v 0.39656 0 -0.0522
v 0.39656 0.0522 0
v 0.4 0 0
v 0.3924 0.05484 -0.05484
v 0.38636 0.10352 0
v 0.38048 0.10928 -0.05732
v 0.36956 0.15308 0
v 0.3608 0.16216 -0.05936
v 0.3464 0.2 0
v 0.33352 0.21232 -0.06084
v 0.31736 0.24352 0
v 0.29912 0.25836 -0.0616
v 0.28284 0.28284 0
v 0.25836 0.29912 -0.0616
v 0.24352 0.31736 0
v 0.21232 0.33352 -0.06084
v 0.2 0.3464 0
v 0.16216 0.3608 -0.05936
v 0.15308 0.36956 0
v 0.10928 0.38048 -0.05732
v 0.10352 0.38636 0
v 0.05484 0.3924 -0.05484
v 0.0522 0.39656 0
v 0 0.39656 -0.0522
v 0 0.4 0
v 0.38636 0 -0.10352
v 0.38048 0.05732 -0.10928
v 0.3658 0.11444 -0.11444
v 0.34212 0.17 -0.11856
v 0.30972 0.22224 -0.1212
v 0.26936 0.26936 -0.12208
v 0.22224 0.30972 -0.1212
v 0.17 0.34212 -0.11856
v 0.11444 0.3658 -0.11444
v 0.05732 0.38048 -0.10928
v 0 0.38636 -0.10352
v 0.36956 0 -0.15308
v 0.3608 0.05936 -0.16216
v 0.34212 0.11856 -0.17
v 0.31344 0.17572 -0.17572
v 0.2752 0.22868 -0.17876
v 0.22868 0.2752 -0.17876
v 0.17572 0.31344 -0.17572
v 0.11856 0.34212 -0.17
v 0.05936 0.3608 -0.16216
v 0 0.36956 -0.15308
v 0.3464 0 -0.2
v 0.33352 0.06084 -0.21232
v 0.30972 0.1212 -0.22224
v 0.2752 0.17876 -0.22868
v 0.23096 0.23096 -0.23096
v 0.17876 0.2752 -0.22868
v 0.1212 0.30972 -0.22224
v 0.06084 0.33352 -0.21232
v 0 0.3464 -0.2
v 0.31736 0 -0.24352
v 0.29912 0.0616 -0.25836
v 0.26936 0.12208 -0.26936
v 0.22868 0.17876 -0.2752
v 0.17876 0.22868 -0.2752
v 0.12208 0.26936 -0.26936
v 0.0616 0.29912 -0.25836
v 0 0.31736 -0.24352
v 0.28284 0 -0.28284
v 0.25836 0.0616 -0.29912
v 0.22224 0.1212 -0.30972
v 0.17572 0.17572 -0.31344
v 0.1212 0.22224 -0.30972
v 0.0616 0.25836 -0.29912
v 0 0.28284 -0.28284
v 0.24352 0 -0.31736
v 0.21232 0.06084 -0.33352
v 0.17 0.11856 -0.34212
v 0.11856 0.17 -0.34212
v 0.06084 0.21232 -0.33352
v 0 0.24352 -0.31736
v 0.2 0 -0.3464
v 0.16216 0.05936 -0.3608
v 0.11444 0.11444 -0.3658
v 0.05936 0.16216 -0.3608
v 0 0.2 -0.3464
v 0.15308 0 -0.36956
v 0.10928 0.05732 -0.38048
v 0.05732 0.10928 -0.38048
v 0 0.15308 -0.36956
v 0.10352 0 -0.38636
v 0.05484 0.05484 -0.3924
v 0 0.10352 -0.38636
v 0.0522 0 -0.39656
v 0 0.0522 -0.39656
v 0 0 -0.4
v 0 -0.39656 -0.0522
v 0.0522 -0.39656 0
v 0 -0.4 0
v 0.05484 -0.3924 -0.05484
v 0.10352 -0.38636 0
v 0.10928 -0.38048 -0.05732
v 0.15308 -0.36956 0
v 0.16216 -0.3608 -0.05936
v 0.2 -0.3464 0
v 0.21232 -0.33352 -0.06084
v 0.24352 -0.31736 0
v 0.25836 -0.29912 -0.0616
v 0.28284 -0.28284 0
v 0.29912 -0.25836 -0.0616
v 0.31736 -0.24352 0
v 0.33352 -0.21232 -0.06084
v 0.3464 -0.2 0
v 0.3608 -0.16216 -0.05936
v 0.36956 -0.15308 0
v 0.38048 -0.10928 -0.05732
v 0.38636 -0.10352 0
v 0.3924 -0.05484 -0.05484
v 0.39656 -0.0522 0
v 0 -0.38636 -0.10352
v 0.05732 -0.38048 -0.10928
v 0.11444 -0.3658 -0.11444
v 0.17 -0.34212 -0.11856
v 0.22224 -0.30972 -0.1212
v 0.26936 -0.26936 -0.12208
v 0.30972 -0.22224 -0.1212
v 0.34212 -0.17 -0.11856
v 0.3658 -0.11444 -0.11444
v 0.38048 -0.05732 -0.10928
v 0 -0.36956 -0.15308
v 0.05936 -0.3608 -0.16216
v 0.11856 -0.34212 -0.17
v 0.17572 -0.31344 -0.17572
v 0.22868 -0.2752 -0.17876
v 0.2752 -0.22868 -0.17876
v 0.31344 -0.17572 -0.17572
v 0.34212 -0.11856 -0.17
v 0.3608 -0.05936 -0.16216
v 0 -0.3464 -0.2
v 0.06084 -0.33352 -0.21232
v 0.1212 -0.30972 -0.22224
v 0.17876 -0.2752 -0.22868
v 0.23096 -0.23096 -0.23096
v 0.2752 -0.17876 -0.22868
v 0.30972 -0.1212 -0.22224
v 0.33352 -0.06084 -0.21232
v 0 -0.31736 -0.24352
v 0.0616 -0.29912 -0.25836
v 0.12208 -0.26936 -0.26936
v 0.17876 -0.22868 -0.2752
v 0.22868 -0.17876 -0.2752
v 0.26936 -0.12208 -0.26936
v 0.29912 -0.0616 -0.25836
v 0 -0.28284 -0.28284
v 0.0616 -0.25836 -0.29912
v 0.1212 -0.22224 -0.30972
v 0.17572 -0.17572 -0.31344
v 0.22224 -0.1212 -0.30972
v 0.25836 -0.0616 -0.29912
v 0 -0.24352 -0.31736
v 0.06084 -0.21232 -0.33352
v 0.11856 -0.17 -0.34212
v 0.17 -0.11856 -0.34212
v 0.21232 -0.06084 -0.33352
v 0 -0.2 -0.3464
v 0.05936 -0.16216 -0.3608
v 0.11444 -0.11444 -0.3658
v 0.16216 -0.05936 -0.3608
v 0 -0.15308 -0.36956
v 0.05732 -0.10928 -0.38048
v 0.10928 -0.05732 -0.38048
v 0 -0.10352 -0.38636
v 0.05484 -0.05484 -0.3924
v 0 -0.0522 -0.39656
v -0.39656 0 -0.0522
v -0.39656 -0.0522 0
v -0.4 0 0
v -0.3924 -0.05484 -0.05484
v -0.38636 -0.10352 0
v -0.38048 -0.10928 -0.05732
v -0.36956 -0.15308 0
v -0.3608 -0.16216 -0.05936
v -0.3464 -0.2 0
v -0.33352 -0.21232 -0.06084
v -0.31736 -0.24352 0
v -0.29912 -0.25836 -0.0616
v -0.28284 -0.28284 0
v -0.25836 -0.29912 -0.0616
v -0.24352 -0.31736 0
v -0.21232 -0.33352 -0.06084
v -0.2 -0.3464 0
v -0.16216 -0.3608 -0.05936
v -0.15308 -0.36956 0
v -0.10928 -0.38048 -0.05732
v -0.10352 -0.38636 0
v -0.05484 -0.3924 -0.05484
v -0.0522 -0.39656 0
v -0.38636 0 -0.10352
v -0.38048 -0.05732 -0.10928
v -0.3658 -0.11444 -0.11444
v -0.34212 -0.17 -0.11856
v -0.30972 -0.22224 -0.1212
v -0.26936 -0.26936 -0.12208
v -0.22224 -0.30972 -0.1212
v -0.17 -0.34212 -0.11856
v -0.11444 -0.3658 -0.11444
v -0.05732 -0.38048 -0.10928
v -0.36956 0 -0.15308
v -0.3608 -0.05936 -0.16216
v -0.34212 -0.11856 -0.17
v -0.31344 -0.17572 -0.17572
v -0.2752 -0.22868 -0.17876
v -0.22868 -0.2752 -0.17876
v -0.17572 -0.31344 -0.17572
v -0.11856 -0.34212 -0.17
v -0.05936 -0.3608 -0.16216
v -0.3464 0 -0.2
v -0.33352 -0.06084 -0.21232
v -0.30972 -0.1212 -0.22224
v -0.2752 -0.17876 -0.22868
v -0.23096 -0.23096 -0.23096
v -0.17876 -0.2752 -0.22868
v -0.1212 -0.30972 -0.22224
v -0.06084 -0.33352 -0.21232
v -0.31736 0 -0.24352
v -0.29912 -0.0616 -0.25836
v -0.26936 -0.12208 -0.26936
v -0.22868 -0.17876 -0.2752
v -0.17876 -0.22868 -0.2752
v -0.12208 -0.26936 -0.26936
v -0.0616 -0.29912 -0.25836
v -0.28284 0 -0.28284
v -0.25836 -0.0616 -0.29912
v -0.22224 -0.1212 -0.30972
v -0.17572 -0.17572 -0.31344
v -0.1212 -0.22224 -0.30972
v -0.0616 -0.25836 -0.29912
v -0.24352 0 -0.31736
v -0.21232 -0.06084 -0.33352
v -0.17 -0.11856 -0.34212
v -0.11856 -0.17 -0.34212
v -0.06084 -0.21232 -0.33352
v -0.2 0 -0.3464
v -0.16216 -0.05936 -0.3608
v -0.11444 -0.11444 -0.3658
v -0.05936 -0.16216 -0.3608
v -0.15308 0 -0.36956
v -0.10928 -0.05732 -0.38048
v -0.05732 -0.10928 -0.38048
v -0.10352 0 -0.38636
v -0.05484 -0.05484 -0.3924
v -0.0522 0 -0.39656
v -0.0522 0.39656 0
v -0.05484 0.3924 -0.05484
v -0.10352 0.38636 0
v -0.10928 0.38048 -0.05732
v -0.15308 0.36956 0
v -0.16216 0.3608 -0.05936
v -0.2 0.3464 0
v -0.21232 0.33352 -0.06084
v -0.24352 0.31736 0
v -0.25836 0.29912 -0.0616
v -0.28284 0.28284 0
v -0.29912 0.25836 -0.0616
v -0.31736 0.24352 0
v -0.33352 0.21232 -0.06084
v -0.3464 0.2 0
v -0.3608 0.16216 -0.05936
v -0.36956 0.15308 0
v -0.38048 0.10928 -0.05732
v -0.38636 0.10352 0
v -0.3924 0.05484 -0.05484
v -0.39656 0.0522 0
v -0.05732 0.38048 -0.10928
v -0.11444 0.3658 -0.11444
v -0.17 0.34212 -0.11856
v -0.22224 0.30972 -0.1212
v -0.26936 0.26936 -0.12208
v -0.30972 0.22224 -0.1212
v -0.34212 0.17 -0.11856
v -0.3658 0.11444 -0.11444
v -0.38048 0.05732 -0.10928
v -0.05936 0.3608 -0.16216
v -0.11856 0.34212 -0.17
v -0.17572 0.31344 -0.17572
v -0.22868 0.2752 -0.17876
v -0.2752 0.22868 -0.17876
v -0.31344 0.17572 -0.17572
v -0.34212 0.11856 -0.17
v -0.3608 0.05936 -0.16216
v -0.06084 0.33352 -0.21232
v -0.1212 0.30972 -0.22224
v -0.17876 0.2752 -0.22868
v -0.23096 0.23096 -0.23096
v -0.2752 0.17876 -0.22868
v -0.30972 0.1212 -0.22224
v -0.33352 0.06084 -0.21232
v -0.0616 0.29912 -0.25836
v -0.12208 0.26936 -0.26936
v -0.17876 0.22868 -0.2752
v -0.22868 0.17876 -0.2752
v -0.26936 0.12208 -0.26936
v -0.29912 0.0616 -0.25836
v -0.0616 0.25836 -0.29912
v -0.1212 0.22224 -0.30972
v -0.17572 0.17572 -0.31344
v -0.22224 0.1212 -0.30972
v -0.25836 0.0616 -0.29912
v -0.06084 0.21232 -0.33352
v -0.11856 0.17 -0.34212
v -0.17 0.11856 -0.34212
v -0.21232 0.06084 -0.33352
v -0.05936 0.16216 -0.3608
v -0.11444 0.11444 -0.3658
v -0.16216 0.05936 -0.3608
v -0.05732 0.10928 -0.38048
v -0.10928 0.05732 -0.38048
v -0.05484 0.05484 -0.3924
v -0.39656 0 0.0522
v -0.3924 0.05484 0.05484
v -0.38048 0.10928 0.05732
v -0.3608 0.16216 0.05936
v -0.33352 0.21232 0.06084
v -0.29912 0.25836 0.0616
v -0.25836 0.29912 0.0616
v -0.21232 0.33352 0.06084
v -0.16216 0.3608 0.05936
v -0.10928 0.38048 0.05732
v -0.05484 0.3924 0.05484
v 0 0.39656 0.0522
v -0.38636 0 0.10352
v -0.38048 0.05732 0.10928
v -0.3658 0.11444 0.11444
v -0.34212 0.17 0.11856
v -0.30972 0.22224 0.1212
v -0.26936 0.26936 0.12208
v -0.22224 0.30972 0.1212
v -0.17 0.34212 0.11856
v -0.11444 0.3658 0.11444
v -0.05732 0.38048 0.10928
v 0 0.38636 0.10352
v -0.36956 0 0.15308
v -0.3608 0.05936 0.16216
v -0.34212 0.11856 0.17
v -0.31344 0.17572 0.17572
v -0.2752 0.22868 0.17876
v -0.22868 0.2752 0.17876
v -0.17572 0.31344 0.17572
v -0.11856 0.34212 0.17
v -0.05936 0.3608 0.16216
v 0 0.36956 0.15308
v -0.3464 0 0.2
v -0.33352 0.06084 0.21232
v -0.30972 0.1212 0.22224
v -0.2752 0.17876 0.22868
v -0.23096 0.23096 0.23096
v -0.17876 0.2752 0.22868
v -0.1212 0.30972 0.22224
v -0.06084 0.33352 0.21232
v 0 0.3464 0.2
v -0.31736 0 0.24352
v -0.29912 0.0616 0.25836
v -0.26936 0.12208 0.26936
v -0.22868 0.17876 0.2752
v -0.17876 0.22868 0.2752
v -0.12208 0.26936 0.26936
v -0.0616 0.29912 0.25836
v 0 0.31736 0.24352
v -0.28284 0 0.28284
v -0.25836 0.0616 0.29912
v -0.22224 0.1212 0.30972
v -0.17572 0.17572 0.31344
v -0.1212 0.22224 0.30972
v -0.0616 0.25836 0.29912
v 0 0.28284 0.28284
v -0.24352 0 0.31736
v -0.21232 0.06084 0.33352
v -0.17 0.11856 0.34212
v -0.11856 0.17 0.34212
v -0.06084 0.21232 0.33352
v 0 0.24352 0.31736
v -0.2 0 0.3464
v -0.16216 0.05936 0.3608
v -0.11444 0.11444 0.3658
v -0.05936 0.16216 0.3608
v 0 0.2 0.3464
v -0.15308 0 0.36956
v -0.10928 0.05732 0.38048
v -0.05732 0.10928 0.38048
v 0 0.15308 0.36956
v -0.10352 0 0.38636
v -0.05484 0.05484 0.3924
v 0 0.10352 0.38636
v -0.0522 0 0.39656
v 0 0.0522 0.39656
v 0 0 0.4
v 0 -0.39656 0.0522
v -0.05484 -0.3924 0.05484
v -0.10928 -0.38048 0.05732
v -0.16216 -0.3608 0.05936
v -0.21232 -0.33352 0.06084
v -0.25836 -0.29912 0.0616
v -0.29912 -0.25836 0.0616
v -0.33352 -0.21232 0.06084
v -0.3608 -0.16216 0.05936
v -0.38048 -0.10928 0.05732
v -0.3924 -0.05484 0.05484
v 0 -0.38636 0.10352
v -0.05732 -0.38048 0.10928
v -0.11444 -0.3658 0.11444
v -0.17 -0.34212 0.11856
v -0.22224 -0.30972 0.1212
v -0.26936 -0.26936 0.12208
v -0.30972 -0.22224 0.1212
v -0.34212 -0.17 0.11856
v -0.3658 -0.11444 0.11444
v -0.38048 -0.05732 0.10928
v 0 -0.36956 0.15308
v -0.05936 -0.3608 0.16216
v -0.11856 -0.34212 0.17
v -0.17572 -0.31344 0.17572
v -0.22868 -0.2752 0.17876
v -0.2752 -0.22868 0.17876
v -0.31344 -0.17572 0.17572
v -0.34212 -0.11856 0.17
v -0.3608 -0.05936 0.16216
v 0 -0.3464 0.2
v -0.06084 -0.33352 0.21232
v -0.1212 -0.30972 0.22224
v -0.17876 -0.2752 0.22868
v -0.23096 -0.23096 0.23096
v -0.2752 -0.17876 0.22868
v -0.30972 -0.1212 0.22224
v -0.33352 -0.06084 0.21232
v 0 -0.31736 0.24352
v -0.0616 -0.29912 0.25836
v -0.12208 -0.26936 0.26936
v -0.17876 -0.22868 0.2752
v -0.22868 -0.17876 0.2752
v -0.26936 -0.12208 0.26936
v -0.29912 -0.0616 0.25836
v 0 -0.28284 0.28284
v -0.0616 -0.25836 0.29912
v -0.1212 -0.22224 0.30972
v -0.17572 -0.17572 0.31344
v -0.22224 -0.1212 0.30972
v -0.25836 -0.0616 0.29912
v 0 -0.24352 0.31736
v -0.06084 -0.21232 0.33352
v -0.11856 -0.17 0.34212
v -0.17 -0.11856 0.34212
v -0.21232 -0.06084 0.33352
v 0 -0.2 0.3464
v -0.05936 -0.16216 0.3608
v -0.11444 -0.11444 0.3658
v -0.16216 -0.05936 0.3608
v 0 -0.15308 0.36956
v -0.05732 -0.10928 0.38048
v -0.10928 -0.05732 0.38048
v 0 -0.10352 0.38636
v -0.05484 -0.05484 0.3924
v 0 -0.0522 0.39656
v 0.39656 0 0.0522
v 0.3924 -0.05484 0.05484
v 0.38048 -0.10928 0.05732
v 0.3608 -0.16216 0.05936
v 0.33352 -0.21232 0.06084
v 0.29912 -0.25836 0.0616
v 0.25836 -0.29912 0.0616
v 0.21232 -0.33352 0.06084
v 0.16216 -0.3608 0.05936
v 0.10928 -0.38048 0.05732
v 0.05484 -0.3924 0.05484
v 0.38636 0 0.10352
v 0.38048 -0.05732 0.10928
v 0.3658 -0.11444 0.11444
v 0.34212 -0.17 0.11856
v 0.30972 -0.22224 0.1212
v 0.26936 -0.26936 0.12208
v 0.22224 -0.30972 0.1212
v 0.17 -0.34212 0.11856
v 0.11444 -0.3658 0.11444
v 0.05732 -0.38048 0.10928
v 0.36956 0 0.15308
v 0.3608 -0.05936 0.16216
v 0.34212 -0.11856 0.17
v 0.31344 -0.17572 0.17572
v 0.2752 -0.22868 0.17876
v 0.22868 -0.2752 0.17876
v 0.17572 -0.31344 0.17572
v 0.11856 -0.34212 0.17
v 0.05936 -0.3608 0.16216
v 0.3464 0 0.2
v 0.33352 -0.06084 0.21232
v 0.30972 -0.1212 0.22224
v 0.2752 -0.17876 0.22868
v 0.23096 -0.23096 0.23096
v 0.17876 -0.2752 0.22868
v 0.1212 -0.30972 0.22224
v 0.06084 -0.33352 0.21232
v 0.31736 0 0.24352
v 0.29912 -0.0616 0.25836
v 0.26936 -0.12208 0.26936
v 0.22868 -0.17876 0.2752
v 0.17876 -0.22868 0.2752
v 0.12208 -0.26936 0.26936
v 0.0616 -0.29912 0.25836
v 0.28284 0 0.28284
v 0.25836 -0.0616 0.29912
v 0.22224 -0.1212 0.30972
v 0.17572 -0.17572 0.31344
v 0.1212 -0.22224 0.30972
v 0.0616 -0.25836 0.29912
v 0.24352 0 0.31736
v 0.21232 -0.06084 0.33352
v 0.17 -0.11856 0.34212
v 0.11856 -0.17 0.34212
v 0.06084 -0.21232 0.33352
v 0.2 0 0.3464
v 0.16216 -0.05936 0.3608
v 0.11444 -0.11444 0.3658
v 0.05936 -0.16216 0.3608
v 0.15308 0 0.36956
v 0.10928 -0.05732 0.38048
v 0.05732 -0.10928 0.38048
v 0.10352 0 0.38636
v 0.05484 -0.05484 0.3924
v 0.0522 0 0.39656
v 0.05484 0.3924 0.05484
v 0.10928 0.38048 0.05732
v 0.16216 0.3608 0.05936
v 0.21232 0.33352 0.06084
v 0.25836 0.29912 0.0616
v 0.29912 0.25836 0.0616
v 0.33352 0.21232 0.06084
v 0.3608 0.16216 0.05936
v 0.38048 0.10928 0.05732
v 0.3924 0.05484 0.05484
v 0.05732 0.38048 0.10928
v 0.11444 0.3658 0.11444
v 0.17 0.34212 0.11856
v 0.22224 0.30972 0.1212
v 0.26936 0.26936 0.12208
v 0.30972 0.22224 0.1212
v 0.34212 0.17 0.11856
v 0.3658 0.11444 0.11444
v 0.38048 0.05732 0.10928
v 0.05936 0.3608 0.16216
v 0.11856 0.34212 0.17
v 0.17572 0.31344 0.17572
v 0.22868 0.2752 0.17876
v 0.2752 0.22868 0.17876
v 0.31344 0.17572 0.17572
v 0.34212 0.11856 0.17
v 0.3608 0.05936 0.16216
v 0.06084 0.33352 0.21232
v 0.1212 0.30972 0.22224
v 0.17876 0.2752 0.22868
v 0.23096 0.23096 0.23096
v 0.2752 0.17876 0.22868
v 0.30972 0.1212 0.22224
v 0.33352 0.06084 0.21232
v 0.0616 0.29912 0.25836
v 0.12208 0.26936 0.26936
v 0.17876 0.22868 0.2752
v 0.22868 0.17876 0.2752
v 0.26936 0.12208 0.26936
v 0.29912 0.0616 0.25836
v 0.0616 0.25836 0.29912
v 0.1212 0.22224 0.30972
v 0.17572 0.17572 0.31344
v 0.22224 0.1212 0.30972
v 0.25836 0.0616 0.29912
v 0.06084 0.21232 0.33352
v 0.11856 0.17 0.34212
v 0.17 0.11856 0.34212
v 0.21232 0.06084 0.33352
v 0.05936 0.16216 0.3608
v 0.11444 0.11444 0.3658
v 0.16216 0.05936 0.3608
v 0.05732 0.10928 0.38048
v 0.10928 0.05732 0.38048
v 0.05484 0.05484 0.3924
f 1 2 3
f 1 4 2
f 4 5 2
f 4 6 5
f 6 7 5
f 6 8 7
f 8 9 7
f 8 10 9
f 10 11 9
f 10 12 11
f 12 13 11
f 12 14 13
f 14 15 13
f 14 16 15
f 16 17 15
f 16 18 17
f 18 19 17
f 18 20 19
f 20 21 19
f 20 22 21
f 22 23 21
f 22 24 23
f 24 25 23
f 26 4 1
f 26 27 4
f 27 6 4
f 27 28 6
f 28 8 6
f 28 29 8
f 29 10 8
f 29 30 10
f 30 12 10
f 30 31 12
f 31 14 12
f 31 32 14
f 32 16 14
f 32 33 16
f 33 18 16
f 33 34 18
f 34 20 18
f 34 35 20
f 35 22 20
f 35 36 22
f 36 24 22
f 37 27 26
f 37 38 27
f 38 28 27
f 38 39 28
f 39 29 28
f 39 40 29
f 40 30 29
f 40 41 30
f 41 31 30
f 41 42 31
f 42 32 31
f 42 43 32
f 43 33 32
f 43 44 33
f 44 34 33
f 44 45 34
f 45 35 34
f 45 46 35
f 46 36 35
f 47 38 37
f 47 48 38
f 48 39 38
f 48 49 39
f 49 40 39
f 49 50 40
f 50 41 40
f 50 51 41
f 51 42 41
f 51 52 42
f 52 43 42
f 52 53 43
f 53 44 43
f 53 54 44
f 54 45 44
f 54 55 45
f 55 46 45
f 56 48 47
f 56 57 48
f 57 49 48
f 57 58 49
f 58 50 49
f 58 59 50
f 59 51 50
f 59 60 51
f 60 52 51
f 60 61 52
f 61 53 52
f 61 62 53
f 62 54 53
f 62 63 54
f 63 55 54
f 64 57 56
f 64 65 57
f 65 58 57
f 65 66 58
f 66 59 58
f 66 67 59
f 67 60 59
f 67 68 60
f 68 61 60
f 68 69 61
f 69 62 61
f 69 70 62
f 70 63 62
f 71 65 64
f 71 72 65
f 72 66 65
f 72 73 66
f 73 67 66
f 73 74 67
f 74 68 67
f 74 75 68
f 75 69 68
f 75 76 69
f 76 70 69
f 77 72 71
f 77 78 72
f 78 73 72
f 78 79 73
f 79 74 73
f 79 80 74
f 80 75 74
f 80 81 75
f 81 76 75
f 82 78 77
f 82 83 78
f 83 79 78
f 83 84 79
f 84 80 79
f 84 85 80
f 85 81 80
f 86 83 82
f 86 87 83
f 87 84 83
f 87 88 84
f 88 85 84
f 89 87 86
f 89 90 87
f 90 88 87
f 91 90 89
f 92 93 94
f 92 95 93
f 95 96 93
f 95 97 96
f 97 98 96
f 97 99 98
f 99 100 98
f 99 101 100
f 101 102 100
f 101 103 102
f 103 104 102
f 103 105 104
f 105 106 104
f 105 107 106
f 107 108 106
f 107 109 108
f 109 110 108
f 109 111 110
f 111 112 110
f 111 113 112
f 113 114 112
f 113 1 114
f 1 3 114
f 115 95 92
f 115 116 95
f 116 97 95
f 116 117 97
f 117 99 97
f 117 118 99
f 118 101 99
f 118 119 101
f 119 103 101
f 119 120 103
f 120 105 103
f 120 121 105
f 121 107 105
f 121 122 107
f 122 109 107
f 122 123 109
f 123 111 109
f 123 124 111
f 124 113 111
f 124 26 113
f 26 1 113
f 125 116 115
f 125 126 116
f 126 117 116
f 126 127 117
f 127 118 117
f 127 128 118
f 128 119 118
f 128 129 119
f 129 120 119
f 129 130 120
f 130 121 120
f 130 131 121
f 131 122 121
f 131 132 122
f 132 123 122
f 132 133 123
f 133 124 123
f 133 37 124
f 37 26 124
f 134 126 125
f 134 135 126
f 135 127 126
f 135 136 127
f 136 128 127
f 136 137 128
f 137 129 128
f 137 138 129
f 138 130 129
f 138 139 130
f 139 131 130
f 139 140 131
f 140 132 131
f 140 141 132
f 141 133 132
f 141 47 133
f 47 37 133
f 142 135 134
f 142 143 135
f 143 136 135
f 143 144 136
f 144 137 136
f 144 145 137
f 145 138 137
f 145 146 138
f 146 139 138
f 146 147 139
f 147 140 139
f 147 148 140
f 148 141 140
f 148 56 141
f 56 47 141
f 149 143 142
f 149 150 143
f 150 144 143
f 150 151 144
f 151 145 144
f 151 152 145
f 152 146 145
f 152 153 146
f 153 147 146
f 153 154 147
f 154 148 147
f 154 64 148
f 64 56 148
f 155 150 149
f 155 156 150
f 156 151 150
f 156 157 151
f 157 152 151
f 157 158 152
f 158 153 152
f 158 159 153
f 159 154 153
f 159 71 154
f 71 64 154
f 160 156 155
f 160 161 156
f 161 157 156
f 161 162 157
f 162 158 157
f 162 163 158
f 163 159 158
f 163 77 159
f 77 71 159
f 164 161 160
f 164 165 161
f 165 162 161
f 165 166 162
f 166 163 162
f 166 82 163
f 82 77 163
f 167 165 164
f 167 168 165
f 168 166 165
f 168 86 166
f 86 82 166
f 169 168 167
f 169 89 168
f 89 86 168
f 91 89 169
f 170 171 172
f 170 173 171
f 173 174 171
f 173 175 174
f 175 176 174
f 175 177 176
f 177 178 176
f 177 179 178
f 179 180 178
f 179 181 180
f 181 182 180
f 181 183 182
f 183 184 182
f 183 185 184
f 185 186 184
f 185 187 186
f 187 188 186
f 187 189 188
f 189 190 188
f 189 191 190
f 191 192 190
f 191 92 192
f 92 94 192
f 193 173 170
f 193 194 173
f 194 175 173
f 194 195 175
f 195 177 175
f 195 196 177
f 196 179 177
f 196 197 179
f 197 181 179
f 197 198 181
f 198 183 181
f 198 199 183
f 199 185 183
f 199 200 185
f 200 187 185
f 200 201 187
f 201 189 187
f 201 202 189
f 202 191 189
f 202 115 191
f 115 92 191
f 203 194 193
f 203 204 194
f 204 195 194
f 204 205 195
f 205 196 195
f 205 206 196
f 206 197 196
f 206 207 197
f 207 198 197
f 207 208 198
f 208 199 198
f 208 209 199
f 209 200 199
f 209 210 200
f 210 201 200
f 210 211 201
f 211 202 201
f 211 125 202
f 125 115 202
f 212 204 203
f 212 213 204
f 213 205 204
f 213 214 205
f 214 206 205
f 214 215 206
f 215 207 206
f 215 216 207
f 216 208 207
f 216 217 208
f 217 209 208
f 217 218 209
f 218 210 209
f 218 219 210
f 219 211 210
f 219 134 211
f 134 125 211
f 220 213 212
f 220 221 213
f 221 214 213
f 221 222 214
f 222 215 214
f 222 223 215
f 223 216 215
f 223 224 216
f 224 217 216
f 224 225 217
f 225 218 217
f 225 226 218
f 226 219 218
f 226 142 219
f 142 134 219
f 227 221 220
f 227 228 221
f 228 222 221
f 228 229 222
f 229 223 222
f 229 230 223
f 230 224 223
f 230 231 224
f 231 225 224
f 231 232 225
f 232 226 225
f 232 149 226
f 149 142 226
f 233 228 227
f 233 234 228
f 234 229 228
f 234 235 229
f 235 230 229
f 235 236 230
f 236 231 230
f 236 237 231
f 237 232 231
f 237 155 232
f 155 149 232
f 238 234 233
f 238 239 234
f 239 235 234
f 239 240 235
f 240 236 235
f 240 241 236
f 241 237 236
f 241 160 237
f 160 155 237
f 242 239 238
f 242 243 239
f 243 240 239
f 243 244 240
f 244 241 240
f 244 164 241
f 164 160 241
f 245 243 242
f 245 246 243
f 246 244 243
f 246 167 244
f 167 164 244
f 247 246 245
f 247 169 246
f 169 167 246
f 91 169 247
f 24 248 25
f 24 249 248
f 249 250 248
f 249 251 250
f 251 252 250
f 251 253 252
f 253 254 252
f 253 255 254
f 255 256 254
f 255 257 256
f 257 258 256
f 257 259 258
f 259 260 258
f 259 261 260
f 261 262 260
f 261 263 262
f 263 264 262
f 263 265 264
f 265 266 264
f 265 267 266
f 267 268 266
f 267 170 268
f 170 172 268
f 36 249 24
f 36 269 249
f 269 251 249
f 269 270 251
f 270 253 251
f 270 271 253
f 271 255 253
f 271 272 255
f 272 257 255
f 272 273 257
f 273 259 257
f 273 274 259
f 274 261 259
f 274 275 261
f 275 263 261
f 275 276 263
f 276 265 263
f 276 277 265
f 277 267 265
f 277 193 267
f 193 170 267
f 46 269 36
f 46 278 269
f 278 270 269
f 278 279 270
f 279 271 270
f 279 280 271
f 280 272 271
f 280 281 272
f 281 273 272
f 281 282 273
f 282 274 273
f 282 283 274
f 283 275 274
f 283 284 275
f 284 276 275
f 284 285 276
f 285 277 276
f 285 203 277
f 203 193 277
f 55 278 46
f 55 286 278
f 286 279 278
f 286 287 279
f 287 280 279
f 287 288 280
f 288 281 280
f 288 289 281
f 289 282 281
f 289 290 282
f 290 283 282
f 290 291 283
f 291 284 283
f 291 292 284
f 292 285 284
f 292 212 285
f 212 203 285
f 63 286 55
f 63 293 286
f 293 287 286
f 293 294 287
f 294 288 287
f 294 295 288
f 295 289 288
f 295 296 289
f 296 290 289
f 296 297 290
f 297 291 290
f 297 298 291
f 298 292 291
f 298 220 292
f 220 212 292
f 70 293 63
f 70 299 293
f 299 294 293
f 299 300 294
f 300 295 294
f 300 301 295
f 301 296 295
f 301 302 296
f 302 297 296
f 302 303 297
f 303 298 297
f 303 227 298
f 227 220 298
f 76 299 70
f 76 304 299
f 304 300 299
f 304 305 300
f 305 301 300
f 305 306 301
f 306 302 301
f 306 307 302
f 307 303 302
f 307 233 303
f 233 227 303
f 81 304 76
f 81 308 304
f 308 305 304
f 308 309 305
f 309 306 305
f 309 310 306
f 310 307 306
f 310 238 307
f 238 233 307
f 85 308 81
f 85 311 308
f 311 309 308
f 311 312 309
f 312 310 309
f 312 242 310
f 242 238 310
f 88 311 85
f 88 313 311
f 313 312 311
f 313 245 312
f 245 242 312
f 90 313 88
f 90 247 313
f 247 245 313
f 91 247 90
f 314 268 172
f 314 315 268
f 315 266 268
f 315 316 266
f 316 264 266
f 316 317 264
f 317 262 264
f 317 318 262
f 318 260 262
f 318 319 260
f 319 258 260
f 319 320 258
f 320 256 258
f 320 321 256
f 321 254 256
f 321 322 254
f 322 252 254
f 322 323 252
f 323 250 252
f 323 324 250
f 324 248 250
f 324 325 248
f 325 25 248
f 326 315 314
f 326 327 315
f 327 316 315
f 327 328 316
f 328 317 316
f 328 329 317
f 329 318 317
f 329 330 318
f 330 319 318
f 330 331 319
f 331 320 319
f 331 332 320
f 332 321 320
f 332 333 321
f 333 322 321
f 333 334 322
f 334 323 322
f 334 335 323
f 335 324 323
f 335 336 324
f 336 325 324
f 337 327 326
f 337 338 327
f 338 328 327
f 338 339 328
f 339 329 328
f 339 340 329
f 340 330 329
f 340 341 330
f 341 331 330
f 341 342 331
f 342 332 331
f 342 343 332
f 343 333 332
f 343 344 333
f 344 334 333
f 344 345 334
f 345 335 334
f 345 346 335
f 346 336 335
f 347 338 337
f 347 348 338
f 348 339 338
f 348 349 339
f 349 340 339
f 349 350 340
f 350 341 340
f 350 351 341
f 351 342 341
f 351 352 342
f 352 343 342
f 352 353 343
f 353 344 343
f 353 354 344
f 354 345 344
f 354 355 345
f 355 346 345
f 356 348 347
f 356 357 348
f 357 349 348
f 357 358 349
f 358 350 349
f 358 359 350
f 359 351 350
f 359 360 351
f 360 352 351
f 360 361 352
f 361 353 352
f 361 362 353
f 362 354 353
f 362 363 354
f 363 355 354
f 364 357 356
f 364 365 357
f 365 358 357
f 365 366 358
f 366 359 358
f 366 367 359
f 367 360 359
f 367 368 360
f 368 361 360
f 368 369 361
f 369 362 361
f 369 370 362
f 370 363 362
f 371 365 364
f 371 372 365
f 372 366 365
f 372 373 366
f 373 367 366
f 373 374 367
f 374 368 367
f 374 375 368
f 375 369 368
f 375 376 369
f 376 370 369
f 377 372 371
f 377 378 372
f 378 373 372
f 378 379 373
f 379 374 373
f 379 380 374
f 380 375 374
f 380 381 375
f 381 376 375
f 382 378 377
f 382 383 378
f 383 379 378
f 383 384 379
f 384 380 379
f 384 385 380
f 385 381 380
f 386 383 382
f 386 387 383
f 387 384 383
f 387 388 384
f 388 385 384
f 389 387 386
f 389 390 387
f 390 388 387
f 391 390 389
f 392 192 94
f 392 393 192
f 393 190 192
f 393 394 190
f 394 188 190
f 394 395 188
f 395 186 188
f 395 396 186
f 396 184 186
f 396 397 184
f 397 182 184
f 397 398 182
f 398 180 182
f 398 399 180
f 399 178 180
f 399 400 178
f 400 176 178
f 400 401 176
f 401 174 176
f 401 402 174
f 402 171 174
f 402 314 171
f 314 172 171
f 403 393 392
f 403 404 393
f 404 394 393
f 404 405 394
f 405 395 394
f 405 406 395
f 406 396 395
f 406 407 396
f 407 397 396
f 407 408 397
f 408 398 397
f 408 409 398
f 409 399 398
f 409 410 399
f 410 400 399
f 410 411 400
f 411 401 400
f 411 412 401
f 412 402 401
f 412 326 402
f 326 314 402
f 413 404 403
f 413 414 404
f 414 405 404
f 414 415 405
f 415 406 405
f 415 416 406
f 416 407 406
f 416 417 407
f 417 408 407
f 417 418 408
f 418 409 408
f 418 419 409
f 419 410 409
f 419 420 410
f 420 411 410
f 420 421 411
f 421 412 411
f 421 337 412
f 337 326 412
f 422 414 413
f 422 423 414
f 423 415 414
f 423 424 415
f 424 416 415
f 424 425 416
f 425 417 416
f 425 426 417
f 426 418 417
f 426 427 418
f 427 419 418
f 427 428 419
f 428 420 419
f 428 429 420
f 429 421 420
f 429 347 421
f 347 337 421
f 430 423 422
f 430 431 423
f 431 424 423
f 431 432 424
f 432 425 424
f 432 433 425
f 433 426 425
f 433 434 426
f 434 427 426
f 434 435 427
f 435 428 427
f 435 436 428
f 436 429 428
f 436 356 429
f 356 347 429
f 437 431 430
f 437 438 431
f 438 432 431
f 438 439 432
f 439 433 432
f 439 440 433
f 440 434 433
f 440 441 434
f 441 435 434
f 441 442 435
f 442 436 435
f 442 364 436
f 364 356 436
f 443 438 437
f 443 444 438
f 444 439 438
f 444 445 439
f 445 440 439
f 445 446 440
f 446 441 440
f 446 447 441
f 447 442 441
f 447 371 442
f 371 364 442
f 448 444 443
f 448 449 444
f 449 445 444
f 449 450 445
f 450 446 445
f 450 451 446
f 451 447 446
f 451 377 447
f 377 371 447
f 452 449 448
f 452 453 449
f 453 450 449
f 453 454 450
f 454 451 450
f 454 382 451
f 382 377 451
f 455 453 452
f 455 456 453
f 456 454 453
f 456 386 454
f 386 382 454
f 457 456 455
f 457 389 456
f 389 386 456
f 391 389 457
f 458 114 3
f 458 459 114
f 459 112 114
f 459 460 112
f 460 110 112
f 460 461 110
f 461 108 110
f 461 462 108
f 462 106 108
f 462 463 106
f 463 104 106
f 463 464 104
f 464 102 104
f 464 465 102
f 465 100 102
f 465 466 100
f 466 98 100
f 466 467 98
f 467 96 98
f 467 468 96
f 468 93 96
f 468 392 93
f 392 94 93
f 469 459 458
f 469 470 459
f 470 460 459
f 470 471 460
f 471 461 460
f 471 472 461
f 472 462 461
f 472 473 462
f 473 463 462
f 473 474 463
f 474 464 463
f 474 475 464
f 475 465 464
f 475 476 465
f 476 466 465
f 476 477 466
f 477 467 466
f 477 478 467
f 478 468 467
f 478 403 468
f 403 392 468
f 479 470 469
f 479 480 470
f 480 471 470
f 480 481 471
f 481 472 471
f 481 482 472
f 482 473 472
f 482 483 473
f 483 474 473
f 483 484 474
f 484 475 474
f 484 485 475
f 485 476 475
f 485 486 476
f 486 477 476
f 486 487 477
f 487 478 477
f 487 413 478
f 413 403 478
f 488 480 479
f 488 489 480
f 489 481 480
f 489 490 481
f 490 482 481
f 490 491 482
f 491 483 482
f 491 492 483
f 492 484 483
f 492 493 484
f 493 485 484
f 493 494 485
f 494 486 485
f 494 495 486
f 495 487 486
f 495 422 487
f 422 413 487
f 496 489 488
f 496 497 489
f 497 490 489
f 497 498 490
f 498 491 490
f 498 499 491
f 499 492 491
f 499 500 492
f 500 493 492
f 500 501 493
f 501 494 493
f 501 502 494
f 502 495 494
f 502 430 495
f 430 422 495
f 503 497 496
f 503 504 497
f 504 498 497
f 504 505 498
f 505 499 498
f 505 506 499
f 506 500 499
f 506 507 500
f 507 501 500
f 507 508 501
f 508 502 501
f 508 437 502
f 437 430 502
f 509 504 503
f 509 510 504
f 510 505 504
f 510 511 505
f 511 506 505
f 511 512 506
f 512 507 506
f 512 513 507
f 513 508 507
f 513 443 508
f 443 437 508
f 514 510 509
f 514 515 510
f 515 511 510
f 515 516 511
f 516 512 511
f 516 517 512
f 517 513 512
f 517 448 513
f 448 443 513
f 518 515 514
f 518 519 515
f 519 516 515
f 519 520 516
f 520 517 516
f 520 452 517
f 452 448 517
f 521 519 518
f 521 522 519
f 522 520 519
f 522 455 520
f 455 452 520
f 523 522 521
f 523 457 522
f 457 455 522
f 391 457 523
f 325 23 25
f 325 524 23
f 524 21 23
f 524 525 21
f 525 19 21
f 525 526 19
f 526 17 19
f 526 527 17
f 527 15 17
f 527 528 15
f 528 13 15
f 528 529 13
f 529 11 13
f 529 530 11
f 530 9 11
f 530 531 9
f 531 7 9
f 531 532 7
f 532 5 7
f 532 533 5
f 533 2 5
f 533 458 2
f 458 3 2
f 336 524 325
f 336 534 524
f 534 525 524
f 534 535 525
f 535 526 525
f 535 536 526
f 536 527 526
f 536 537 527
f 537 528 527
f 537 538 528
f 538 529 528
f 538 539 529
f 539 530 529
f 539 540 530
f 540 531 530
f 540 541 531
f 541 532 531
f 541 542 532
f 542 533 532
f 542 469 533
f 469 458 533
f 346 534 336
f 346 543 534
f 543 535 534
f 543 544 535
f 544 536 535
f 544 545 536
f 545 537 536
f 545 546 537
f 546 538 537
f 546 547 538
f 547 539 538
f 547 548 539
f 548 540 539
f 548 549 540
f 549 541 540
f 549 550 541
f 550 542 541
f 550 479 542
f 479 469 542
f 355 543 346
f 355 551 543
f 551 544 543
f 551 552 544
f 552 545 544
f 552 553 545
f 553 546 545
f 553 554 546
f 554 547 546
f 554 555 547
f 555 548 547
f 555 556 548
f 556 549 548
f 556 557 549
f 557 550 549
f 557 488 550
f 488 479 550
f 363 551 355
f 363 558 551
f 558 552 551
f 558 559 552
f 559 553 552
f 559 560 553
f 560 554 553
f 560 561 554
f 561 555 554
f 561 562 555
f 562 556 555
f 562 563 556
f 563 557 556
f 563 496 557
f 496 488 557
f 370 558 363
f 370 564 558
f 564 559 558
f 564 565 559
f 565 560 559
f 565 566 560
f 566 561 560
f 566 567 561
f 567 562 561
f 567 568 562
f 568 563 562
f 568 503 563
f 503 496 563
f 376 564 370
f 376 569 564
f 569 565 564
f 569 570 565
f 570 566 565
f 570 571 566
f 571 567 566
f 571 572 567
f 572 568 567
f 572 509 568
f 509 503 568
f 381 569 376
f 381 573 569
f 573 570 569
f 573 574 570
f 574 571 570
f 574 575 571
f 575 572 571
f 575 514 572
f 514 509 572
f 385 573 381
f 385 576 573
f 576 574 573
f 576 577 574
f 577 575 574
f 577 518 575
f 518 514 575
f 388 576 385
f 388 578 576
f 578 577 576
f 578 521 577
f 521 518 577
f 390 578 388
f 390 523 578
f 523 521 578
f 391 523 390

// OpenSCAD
use <../../lib.scad>
use <1-8sphe.scad>
function ldraw_lib__48__8_8sphe() = [
// 0 Hi-Res Sphere 1.0
// 0 Name: 48\8-8sphe.dat
// 0 Author: Steve Bliss [sbliss]
// 0 !LDRAW_ORG 48_Primitive UPDATE 2012-01
// 0 !LICENSE Licensed under CC BY 2.0 and CC BY 4.0 : see CAreadme.txt
// 
// 0 BFC CERTIFY CCW
  [0,"BFC","CERTIFY"],
  [0,"BFC","CCW"],
// 
// 0 !HISTORY 2012-03-30 [PTadmin] Official Update 2012-01
// 
// 
// 1 16 0 0 0 1 0 0 0 1 0 0 0 1 48\1-8sphe.dat
  [1,16,0,0,0,1,0,0,0,1,0,0,0,1, ldraw_lib__48__1_8sphe()],
// 1 16 0 0 0 0 0 1 0 1 0 -1 0 0 48\1-8sphe.dat
  [1,16,0,0,0,0,0,1,0,1,0,-1,0,0, ldraw_lib__48__1_8sphe()],
// 1 16 0 0 0 -1 0 0 0 1 0 0 0 -1 48\1-8sphe.dat
  [1,16,0,0,0,-1,0,0,0,1,0,0,0,-1, ldraw_lib__48__1_8sphe()],
// 1 16 0 0 0 0 0 -1 0 1 0 1 0 0 48\1-8sphe.dat
  [1,16,0,0,0,0,0,-1,0,1,0,1,0,0, ldraw_lib__48__1_8sphe()],
// 1 16 0 0 0 -1 0 0 0 -1 0 0 0 1 48\1-8sphe.dat
  [1,16,0,0,0,-1,0,0,0,-1,0,0,0,1, ldraw_lib__48__1_8sphe()],
// 1 16 0 0 0 0 0 -1 0 -1 0 -1 0 0 48\1-8sphe.dat
  [1,16,0,0,0,0,0,-1,0,-1,0,-1,0,0, ldraw_lib__48__1_8sphe()],
// 1 16 0 0 0 1 0 0 0 -1 0 0 0 -1 48\1-8sphe.dat
  [1,16,0,0,0,1,0,0,0,-1,0,0,0,-1, ldraw_lib__48__1_8sphe()],
// 1 16 0 0 0 0 0 1 0 -1 0 1 0 0 48\1-8sphe.dat
  [1,16,0,0,0,0,0,1,0,-1,0,1,0,0, ldraw_lib__48__1_8sphe()],
// 0
];
module ldraw_lib__48__8_8sphe(step=0, col=false, unit=2/5, alt=false, line=0.2, solid=!$preview)
    makepoly(ldraw_lib__48__8_8sphe(), step=step, col=col, unit=unit, alt=alt, line=line, solid=solid);
ldraw_lib__48__8_8sphe(line=0.2);
